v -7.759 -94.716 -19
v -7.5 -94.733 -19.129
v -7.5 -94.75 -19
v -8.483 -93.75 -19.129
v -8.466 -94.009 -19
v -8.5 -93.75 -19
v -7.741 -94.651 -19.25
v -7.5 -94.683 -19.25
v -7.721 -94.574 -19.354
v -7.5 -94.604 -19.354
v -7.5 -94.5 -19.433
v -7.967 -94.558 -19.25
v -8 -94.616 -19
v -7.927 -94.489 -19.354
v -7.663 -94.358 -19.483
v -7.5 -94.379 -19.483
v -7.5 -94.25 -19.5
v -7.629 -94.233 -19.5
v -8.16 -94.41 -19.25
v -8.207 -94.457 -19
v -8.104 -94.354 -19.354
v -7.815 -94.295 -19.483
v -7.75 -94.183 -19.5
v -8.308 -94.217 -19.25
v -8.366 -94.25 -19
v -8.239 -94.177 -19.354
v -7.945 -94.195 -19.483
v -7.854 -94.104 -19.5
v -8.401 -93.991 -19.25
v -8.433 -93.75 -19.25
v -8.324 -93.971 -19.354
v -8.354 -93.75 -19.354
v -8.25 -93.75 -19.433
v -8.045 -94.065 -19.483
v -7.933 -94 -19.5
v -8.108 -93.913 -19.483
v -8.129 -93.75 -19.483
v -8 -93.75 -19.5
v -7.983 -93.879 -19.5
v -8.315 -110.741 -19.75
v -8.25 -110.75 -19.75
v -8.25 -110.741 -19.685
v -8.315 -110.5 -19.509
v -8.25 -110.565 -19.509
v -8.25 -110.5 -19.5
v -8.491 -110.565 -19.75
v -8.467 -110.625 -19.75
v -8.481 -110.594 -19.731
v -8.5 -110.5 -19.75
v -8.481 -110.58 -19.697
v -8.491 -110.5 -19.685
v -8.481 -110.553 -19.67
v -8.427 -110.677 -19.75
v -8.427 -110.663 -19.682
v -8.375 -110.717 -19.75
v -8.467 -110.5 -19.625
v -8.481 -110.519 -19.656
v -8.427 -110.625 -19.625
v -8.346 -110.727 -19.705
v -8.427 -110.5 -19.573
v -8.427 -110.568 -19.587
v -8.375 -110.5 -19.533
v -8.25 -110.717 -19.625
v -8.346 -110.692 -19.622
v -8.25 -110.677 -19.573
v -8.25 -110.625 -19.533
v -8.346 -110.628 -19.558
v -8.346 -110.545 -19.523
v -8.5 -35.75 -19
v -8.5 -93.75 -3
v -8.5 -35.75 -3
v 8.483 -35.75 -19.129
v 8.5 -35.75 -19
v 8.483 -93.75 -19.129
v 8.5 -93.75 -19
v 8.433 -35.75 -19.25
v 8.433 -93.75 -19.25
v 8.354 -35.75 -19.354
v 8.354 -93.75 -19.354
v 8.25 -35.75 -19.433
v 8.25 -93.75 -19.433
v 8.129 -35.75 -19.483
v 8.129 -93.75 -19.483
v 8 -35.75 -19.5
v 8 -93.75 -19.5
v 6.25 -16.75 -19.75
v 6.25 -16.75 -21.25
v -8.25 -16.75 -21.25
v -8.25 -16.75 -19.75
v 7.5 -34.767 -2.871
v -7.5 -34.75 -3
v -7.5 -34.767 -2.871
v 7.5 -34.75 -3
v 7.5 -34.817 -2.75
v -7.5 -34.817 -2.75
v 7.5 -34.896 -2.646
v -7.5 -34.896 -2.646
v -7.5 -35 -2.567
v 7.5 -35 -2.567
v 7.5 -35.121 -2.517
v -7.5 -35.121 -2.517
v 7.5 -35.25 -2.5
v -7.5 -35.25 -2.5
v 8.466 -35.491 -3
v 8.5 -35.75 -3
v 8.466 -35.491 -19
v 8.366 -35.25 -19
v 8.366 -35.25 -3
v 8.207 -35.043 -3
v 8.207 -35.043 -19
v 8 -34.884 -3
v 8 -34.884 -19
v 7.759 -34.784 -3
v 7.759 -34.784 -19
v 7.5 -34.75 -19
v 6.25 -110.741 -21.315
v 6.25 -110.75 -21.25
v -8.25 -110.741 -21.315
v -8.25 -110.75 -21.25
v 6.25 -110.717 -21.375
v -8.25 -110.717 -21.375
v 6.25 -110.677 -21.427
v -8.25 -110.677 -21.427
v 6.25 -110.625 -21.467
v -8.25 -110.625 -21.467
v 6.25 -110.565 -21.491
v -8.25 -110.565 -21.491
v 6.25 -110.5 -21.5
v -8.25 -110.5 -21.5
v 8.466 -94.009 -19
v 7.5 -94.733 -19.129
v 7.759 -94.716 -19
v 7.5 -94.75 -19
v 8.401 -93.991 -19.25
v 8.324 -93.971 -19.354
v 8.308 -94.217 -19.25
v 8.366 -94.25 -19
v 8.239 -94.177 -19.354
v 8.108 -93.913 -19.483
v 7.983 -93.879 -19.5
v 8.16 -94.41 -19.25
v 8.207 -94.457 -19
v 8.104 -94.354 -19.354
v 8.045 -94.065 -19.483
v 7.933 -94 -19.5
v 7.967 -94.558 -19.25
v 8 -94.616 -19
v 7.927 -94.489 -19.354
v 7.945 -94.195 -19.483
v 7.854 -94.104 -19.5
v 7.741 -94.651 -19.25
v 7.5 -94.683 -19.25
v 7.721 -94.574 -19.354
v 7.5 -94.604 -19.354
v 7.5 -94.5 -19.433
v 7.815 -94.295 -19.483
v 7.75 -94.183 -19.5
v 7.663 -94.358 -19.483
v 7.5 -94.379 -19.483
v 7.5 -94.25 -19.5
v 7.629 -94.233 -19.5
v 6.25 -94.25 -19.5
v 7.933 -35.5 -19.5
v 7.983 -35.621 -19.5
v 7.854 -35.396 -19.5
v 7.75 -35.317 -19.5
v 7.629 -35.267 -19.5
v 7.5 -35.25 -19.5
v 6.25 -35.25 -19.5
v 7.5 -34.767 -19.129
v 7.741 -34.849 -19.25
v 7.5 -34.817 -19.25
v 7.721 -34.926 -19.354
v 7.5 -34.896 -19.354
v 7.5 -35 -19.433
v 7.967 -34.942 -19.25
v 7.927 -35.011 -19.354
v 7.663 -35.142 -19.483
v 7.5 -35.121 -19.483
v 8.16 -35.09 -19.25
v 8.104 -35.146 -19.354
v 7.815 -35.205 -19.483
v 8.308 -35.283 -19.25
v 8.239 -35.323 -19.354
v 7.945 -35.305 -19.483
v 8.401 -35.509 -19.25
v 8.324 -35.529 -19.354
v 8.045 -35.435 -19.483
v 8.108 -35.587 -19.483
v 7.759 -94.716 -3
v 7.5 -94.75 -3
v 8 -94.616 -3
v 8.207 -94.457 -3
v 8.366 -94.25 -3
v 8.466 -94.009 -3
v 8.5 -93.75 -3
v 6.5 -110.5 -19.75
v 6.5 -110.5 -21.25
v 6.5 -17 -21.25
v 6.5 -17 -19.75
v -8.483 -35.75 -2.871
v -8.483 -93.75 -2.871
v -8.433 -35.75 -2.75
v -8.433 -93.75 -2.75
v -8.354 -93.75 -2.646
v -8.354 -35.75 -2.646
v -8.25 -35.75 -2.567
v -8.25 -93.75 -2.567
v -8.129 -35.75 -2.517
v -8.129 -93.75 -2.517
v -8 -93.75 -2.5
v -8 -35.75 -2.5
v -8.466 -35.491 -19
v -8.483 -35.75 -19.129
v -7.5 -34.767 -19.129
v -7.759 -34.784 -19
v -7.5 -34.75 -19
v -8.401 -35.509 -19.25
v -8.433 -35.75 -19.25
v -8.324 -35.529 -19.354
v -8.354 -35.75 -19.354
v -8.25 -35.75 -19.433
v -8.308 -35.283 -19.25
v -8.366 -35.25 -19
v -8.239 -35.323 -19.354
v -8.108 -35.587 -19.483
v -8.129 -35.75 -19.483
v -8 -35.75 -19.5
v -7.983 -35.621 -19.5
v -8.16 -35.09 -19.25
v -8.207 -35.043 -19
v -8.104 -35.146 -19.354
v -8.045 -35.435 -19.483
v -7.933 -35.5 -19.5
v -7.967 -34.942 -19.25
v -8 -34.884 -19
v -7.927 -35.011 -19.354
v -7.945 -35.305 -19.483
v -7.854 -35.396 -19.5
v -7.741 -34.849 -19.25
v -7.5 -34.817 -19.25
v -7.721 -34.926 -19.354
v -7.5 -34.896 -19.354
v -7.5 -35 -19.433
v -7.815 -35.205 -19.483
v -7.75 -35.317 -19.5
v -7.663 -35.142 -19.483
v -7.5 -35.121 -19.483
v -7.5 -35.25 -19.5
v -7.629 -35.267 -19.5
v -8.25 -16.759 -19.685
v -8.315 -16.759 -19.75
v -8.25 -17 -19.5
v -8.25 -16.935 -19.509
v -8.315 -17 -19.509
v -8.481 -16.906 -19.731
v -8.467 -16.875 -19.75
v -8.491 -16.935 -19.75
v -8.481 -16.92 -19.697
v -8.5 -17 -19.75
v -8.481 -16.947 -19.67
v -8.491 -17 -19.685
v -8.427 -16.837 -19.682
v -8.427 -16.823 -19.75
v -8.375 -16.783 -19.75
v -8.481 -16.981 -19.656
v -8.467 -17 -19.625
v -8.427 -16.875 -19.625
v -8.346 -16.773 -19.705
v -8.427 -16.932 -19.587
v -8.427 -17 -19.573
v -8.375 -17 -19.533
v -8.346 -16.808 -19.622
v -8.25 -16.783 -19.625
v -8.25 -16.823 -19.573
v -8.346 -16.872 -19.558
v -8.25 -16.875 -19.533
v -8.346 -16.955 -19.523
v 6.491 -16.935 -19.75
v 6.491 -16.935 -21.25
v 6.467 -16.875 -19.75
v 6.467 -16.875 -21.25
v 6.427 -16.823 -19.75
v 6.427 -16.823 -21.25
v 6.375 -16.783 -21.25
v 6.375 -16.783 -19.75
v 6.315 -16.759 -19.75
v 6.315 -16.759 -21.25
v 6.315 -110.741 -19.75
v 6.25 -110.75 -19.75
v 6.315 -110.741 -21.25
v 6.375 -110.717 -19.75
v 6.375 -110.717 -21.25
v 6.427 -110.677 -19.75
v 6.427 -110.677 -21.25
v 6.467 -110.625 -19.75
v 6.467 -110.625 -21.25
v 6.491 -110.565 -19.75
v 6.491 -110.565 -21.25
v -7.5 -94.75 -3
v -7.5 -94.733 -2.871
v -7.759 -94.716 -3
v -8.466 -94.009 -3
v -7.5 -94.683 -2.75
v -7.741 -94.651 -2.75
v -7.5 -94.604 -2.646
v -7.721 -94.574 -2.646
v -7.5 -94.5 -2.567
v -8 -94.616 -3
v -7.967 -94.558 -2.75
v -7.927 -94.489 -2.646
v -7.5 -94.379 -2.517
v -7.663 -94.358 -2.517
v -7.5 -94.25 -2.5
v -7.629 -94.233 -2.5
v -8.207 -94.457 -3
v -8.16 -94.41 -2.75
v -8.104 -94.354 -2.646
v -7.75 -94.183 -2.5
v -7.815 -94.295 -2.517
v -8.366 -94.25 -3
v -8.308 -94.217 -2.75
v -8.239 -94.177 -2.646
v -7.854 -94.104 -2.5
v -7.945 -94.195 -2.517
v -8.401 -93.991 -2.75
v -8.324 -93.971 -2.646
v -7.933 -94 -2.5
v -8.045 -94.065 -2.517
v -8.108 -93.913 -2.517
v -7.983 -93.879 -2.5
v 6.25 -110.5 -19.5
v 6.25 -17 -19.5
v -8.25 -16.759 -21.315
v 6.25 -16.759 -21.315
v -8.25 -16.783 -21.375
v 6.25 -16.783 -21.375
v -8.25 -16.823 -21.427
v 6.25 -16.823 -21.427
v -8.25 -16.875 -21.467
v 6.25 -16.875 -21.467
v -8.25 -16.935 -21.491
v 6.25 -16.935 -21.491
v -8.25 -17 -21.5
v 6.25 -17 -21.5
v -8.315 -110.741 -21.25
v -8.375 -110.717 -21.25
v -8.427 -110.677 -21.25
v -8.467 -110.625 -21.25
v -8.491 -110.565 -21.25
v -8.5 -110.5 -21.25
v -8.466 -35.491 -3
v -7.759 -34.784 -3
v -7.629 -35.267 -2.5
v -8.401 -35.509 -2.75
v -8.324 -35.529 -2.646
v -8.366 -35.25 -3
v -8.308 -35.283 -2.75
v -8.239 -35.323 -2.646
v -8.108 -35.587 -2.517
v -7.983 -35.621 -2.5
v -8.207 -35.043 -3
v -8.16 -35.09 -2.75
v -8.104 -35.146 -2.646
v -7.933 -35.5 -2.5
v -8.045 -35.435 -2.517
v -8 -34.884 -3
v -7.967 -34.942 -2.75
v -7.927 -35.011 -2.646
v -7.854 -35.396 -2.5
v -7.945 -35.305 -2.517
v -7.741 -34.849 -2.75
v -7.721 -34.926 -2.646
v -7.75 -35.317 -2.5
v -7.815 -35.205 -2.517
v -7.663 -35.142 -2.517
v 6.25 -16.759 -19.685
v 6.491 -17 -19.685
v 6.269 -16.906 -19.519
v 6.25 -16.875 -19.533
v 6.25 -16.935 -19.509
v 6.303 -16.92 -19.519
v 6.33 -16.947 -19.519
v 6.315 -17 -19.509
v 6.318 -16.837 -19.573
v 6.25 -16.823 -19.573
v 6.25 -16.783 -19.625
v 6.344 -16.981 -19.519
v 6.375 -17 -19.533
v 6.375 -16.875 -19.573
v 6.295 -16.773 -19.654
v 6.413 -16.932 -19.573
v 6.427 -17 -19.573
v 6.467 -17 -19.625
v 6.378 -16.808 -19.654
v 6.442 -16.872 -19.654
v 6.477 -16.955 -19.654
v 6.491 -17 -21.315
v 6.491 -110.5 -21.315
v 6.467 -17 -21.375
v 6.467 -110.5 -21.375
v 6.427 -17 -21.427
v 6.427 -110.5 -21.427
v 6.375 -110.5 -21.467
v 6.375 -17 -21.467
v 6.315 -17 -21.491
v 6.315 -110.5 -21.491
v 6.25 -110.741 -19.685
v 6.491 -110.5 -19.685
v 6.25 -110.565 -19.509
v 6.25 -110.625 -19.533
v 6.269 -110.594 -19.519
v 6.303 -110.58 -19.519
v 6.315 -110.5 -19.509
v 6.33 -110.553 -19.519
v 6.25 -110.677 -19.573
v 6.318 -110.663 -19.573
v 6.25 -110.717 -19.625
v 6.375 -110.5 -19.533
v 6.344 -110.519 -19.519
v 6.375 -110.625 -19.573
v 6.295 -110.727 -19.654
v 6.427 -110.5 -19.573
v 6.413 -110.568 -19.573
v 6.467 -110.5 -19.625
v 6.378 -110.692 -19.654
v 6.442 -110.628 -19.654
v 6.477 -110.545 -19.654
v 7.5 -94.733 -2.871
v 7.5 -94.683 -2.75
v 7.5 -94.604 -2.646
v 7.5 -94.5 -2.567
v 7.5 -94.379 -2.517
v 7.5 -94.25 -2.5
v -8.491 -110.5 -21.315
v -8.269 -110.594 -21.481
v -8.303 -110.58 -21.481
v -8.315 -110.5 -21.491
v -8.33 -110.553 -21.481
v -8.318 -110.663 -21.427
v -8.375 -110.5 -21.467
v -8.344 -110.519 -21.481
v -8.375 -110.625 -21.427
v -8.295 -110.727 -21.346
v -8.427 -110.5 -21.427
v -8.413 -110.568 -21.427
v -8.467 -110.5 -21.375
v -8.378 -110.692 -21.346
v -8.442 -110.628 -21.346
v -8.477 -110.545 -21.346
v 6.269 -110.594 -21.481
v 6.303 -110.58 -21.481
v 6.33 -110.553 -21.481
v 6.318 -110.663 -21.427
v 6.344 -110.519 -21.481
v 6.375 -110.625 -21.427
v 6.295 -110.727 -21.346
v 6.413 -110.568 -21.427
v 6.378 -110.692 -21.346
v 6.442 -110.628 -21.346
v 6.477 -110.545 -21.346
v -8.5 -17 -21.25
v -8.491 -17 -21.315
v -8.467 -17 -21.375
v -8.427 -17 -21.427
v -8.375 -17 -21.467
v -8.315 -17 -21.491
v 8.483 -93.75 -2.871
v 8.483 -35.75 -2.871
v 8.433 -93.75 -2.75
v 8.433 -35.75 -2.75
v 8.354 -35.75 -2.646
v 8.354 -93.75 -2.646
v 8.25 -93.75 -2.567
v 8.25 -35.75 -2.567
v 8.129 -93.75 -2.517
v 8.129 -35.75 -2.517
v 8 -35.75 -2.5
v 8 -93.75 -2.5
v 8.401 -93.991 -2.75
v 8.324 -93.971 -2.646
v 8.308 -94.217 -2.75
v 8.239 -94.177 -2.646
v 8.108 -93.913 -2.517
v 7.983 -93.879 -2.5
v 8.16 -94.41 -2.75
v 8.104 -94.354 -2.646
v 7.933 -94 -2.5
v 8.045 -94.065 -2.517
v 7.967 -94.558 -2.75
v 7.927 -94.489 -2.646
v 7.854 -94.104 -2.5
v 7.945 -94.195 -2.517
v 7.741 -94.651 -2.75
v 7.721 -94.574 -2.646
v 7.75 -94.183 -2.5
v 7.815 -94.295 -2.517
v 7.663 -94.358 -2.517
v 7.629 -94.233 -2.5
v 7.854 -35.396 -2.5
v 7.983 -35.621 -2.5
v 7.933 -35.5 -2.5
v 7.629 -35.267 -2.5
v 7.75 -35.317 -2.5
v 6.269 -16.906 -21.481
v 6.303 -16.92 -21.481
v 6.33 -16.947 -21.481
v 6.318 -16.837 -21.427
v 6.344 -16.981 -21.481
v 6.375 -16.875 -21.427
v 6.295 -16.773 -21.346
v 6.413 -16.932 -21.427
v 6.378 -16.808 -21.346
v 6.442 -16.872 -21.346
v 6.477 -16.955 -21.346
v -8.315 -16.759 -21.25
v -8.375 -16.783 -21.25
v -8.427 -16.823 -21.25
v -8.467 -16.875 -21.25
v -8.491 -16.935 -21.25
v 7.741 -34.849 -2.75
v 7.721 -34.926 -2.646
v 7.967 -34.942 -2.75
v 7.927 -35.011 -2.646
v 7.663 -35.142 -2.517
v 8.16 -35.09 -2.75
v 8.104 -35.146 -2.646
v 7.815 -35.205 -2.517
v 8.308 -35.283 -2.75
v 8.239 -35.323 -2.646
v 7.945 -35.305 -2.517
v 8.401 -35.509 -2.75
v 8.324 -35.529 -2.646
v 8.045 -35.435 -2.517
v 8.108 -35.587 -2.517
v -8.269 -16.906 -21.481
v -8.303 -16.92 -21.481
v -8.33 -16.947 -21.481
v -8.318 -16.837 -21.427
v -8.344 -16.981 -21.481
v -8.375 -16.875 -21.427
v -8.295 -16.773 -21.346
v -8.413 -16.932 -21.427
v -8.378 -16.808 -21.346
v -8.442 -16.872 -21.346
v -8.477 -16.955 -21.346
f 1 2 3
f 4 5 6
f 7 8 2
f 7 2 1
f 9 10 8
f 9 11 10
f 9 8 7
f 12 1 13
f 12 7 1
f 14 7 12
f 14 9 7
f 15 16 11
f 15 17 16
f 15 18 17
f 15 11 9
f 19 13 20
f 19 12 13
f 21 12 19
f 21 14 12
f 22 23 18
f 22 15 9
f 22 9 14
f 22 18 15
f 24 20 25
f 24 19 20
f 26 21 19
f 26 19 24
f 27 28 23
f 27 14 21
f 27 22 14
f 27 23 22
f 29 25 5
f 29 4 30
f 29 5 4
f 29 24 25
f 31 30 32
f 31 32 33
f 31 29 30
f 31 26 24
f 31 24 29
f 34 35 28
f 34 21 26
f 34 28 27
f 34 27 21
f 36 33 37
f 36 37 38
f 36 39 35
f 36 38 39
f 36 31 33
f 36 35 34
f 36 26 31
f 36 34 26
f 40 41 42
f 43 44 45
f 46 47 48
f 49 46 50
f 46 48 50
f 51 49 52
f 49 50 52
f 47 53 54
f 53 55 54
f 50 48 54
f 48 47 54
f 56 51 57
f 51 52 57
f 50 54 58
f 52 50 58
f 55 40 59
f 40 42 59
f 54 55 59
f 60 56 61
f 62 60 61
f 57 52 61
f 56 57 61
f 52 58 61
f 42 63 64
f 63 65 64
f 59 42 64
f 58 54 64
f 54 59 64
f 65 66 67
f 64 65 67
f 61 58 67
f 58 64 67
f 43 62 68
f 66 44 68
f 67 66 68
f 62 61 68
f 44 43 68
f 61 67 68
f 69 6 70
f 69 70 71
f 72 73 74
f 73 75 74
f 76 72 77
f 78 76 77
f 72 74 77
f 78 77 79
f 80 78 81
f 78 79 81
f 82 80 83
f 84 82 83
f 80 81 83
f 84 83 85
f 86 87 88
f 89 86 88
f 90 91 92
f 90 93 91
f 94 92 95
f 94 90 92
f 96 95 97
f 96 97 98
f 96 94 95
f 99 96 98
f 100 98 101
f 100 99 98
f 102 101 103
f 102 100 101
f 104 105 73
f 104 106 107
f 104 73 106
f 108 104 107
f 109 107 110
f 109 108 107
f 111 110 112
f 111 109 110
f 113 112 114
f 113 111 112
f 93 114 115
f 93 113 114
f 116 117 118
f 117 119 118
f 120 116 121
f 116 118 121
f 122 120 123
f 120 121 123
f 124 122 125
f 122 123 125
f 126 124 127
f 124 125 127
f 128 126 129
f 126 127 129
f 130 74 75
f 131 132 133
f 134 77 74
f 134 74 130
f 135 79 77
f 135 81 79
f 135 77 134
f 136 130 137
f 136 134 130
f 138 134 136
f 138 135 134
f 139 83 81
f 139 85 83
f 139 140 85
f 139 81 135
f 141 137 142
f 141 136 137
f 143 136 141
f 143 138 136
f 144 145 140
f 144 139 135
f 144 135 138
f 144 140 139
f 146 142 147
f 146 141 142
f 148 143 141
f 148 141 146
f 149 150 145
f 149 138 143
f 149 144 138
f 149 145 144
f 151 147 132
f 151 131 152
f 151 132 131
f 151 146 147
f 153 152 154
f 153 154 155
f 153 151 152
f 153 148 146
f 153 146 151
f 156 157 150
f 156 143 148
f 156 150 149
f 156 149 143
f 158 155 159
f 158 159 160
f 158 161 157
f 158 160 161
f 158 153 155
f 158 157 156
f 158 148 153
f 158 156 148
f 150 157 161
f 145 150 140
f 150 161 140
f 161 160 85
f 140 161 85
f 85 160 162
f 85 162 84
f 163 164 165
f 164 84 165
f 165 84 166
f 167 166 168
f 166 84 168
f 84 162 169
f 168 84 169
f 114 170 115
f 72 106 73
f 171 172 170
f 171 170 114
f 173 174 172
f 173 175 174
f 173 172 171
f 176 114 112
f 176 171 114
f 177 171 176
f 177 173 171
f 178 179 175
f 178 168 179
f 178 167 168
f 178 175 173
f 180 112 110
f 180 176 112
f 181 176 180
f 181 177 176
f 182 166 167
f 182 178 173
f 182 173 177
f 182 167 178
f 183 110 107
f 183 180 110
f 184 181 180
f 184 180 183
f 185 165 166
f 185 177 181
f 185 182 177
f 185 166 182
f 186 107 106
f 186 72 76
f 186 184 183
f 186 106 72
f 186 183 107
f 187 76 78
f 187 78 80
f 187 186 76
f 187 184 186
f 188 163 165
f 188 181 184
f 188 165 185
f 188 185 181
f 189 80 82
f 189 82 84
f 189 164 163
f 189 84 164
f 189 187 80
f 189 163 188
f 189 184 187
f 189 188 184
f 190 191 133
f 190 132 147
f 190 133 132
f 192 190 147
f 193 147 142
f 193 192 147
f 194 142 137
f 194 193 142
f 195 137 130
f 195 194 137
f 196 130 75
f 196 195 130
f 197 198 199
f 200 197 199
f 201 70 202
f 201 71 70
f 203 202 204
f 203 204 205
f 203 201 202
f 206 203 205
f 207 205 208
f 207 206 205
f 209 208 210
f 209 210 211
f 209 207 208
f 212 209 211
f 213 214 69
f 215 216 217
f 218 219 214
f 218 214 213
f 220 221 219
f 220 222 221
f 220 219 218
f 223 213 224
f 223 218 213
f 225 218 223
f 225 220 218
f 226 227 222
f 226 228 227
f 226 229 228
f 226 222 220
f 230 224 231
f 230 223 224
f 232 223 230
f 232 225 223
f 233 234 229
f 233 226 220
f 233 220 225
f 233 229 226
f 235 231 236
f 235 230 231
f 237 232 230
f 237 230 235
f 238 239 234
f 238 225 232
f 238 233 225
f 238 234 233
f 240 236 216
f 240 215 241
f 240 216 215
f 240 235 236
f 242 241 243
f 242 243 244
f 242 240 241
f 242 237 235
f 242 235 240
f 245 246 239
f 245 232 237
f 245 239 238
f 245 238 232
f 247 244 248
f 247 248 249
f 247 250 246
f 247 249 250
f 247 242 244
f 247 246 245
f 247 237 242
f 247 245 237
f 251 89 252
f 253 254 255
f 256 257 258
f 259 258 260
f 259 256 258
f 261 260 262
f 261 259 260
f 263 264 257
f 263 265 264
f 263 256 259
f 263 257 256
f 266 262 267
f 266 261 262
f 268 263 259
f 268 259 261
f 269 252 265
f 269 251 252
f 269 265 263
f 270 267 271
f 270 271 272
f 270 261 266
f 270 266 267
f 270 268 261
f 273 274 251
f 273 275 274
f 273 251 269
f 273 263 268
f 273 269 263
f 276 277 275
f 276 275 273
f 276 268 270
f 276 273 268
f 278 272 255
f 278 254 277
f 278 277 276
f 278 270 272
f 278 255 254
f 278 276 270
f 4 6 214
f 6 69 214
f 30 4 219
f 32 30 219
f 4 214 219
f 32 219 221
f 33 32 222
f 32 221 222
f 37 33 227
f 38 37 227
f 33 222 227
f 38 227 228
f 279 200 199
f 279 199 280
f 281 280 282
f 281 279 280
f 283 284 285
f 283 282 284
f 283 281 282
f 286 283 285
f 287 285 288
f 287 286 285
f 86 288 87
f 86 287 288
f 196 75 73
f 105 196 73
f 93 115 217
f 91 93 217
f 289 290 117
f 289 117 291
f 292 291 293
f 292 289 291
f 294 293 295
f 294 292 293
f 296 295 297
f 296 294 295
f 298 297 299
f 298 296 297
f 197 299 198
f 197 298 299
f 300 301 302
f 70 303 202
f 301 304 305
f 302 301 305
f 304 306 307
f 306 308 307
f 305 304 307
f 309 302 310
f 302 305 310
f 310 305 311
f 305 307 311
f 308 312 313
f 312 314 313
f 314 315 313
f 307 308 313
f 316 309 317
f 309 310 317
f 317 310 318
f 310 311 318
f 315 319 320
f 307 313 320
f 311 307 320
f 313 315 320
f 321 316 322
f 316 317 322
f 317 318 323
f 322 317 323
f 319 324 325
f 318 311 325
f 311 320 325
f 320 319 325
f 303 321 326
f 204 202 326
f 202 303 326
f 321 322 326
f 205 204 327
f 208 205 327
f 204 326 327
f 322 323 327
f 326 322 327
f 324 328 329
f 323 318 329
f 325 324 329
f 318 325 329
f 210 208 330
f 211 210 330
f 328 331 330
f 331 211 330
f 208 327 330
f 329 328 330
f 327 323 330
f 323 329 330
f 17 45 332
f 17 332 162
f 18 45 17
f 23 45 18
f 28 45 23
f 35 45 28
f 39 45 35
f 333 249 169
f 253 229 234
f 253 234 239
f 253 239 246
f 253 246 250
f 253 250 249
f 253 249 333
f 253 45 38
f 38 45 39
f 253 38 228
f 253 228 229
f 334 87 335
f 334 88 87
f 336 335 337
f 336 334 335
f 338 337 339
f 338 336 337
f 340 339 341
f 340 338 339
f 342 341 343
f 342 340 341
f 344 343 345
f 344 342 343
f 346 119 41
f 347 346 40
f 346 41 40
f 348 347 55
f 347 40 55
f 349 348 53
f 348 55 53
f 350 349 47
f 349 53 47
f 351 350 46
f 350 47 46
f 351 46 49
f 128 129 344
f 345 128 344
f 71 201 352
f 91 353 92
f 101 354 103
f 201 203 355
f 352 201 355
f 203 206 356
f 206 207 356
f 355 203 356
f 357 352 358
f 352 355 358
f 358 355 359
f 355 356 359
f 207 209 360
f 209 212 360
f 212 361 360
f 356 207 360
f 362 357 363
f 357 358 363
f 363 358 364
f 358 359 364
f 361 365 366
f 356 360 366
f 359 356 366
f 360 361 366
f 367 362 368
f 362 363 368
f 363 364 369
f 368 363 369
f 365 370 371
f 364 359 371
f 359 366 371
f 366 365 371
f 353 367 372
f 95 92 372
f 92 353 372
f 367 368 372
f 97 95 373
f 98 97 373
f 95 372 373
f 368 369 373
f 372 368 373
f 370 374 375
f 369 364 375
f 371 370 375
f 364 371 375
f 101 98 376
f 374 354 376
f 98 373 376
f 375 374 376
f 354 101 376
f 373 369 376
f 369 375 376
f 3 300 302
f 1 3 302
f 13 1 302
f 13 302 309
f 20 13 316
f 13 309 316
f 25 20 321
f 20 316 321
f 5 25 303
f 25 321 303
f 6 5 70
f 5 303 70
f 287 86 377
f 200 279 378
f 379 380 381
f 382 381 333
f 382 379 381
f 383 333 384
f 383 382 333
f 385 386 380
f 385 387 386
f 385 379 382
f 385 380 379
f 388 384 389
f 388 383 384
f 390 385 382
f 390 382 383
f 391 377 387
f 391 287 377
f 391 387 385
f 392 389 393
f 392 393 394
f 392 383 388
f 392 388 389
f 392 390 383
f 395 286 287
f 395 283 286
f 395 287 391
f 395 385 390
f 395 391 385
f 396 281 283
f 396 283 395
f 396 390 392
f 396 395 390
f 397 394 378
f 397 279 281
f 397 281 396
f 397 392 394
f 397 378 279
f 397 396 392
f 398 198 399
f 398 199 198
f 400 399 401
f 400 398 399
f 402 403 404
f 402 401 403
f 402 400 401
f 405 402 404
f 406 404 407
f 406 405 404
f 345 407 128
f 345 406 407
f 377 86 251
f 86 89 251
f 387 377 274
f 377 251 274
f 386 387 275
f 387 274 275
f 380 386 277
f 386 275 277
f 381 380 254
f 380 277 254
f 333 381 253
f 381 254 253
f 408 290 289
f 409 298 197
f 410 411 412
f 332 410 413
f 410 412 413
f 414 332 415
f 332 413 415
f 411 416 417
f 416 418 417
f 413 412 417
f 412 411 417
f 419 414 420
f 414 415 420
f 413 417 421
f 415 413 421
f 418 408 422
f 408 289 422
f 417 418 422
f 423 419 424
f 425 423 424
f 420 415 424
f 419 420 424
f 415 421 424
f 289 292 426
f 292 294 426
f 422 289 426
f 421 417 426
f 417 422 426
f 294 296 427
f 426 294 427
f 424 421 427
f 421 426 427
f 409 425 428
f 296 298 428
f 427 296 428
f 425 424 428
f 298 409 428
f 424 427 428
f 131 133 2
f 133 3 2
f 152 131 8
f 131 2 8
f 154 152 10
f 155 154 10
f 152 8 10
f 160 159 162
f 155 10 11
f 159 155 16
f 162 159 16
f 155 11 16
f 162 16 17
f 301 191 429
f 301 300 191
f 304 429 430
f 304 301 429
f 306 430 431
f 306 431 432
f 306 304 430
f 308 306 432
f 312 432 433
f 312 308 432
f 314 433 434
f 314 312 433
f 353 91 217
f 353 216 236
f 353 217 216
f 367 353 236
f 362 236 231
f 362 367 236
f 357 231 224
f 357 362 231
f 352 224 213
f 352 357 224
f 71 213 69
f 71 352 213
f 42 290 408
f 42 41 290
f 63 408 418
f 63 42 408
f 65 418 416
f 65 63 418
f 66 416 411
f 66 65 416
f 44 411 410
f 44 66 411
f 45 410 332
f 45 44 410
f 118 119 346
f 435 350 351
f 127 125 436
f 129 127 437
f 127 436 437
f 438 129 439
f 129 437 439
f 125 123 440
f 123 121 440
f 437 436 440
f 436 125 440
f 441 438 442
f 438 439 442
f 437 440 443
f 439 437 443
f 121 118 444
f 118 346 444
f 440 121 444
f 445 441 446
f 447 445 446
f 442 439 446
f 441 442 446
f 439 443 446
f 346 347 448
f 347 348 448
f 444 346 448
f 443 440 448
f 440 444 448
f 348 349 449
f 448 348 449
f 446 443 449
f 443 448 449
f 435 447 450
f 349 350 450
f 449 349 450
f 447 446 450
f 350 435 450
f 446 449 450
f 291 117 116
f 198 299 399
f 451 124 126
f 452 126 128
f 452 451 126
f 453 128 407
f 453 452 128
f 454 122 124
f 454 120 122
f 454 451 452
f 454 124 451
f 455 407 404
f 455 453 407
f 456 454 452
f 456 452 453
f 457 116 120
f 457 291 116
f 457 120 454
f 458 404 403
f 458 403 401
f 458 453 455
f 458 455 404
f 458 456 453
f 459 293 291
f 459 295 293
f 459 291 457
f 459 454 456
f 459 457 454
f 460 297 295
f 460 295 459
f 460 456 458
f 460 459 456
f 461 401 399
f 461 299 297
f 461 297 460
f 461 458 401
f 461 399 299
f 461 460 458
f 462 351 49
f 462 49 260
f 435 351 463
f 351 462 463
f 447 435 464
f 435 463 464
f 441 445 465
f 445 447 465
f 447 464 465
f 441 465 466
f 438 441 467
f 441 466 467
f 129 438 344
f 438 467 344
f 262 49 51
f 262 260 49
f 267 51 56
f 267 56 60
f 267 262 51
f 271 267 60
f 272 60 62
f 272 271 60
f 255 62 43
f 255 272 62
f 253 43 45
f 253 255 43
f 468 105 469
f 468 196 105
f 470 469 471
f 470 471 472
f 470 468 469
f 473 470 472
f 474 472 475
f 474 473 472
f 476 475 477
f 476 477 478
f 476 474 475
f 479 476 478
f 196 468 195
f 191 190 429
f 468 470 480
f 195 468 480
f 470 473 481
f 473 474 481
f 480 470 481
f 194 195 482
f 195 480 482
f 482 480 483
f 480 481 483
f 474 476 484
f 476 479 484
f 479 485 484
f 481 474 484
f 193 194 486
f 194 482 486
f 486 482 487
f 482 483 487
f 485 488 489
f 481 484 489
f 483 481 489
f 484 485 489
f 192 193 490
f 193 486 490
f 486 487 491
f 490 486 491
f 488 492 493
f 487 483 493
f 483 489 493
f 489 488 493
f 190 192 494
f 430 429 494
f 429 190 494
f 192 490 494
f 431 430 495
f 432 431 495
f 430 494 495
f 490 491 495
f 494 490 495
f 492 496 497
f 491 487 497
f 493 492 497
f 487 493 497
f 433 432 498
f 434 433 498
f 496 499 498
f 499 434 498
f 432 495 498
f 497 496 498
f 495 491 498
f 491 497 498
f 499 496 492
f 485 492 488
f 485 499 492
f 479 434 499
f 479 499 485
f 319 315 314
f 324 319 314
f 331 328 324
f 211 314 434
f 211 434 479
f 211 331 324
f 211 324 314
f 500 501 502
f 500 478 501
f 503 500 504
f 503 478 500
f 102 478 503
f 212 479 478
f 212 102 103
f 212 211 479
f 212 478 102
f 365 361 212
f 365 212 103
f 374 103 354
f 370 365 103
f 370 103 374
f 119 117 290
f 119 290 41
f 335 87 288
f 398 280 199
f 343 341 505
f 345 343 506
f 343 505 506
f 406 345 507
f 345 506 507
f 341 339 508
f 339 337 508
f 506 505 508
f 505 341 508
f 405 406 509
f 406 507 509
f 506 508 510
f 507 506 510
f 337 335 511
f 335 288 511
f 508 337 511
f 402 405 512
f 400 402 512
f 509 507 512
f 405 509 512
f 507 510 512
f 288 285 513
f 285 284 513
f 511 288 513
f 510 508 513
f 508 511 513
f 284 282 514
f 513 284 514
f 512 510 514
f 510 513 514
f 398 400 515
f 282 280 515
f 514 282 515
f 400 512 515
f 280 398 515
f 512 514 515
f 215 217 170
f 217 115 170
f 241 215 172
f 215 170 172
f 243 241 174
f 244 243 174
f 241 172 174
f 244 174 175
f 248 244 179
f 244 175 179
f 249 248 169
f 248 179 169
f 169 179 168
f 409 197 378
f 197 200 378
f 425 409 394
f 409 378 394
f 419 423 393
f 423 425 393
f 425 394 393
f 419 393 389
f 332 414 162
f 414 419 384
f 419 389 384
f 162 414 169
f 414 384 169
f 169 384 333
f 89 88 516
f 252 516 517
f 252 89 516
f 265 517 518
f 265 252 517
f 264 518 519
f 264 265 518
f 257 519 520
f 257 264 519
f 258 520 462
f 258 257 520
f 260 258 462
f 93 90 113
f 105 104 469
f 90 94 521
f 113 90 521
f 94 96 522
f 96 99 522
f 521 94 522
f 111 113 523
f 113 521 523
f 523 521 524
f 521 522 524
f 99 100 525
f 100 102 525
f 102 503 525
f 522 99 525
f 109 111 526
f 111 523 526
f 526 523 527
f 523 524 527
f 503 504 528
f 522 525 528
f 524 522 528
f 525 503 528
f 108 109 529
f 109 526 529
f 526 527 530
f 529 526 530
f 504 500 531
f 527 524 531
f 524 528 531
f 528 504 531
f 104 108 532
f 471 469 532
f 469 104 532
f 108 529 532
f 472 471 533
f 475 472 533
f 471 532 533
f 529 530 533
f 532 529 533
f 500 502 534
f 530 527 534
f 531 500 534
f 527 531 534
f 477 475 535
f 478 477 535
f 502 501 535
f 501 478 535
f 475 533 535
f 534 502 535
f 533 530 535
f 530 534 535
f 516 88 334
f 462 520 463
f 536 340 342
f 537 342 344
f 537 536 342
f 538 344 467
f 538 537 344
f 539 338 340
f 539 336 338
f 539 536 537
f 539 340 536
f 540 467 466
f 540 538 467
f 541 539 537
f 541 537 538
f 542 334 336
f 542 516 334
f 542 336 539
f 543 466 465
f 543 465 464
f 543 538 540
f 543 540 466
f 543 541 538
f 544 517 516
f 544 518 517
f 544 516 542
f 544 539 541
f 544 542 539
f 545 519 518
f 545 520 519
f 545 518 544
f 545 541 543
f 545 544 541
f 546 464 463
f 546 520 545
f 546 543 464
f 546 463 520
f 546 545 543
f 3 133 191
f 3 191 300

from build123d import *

# Parameters (mm, degrees)
BOX009_W                  = 94
BOX009_H                  = 15
BOX009_DEPTH              = 2
FILLET005_R               = 0.25
FILLET005_PLACEMENT_ANGLE = 90
BOX_W                     = 60
BOX_H                     = 17
BOX_DEPTH                 = 17
FILLET001_R               = 1
FILLET004_R               = 0.5
FILLET004_PLACEMENT_ANGLE = 90


with BuildPart() as vrm_cooler_contact001:
    # Box009 → Box009 (new body)
    with BuildSketch(Plane(origin=(-94, -6.5, -2), x_dir=(1, 0, 0), z_dir=(0, 0, 1))):
        with Locations((47, 7.5)):
            Rectangle(BOX009_W, BOX009_H)
    extrude(amount=BOX009_DEPTH)

    # Fillet005
    fillet005_edges = [vrm_cooler_contact001.edges().sort_by_distance(p)[0] for p in [
        (-94, -6.5, -1),
        (-94, 1, 0),
        (-94, 8.5, -1),
        (-94, 1, -2),
        (0, -6.5, -1),
        (0, 1, 0),
        (0, 8.5, -1),
        (0, 1, -2),
        (-47, -6.5, -2),
        (-47, -6.5, 0),
        (-47, 8.5, -2),
        (-47, 8.5, 0),
    ]]
    fillet(fillet005_edges, radius=FILLET005_R)


with BuildPart() as vrm_cooler_contact001_1:
    # Fillet005 placement: moved
    add(vrm_cooler_contact001.part.moved(Location((0, -16.75, -19.5))).rotate(Axis((0, -16.75, -19.5), (0, 0, 1)), FILLET005_PLACEMENT_ANGLE))


with BuildPart() as fusion034:
    # Box → Box (new body)
    with BuildSketch(Plane(origin=(0, -8.5, -17), x_dir=(1, 0, 0), z_dir=(0, 0, 1))):
        with Locations((30, 8.5)):
            Rectangle(BOX_W, BOX_H)
    extrude(amount=BOX_DEPTH)

    # Fillet001
    fillet001_edges = [fusion034.edges().sort_by_distance(p)[0] for p in [
        (0, -8.5, -8.5),
        (0, 8.5, -8.5),
        (60, -8.5, -8.5),
        (60, 8.5, -8.5),
    ]]
    fillet(fillet001_edges, radius=FILLET001_R)

    # Fillet004
    fillet004_edges = [fusion034.edges().sort_by_distance(p)[0] for p in [
        (0, 0, 0),
        (0, 0, -17),
        (30, -8.5, 0),
        (30, 8.5, 0),
        (60, 0, 0),
        (30, -8.5, -17),
        (30, 8.5, -17),
        (60, 0, -17),
    ]]
    fillet(fillet004_edges, radius=FILLET004_R)


with BuildPart() as fusion034_1:
    # Fillet004 placement: moved
    add(fusion034.part.moved(Location((0, -94.75, -2.5))).rotate(Axis((0, -94.75, -2.5), (0, 0, 1)), FILLET004_PLACEMENT_ANGLE))

    # Fusion034: union VRM-Cooler-Contact001
    add(vrm_cooler_contact001_1.part)


solid = fusion034_1.part
